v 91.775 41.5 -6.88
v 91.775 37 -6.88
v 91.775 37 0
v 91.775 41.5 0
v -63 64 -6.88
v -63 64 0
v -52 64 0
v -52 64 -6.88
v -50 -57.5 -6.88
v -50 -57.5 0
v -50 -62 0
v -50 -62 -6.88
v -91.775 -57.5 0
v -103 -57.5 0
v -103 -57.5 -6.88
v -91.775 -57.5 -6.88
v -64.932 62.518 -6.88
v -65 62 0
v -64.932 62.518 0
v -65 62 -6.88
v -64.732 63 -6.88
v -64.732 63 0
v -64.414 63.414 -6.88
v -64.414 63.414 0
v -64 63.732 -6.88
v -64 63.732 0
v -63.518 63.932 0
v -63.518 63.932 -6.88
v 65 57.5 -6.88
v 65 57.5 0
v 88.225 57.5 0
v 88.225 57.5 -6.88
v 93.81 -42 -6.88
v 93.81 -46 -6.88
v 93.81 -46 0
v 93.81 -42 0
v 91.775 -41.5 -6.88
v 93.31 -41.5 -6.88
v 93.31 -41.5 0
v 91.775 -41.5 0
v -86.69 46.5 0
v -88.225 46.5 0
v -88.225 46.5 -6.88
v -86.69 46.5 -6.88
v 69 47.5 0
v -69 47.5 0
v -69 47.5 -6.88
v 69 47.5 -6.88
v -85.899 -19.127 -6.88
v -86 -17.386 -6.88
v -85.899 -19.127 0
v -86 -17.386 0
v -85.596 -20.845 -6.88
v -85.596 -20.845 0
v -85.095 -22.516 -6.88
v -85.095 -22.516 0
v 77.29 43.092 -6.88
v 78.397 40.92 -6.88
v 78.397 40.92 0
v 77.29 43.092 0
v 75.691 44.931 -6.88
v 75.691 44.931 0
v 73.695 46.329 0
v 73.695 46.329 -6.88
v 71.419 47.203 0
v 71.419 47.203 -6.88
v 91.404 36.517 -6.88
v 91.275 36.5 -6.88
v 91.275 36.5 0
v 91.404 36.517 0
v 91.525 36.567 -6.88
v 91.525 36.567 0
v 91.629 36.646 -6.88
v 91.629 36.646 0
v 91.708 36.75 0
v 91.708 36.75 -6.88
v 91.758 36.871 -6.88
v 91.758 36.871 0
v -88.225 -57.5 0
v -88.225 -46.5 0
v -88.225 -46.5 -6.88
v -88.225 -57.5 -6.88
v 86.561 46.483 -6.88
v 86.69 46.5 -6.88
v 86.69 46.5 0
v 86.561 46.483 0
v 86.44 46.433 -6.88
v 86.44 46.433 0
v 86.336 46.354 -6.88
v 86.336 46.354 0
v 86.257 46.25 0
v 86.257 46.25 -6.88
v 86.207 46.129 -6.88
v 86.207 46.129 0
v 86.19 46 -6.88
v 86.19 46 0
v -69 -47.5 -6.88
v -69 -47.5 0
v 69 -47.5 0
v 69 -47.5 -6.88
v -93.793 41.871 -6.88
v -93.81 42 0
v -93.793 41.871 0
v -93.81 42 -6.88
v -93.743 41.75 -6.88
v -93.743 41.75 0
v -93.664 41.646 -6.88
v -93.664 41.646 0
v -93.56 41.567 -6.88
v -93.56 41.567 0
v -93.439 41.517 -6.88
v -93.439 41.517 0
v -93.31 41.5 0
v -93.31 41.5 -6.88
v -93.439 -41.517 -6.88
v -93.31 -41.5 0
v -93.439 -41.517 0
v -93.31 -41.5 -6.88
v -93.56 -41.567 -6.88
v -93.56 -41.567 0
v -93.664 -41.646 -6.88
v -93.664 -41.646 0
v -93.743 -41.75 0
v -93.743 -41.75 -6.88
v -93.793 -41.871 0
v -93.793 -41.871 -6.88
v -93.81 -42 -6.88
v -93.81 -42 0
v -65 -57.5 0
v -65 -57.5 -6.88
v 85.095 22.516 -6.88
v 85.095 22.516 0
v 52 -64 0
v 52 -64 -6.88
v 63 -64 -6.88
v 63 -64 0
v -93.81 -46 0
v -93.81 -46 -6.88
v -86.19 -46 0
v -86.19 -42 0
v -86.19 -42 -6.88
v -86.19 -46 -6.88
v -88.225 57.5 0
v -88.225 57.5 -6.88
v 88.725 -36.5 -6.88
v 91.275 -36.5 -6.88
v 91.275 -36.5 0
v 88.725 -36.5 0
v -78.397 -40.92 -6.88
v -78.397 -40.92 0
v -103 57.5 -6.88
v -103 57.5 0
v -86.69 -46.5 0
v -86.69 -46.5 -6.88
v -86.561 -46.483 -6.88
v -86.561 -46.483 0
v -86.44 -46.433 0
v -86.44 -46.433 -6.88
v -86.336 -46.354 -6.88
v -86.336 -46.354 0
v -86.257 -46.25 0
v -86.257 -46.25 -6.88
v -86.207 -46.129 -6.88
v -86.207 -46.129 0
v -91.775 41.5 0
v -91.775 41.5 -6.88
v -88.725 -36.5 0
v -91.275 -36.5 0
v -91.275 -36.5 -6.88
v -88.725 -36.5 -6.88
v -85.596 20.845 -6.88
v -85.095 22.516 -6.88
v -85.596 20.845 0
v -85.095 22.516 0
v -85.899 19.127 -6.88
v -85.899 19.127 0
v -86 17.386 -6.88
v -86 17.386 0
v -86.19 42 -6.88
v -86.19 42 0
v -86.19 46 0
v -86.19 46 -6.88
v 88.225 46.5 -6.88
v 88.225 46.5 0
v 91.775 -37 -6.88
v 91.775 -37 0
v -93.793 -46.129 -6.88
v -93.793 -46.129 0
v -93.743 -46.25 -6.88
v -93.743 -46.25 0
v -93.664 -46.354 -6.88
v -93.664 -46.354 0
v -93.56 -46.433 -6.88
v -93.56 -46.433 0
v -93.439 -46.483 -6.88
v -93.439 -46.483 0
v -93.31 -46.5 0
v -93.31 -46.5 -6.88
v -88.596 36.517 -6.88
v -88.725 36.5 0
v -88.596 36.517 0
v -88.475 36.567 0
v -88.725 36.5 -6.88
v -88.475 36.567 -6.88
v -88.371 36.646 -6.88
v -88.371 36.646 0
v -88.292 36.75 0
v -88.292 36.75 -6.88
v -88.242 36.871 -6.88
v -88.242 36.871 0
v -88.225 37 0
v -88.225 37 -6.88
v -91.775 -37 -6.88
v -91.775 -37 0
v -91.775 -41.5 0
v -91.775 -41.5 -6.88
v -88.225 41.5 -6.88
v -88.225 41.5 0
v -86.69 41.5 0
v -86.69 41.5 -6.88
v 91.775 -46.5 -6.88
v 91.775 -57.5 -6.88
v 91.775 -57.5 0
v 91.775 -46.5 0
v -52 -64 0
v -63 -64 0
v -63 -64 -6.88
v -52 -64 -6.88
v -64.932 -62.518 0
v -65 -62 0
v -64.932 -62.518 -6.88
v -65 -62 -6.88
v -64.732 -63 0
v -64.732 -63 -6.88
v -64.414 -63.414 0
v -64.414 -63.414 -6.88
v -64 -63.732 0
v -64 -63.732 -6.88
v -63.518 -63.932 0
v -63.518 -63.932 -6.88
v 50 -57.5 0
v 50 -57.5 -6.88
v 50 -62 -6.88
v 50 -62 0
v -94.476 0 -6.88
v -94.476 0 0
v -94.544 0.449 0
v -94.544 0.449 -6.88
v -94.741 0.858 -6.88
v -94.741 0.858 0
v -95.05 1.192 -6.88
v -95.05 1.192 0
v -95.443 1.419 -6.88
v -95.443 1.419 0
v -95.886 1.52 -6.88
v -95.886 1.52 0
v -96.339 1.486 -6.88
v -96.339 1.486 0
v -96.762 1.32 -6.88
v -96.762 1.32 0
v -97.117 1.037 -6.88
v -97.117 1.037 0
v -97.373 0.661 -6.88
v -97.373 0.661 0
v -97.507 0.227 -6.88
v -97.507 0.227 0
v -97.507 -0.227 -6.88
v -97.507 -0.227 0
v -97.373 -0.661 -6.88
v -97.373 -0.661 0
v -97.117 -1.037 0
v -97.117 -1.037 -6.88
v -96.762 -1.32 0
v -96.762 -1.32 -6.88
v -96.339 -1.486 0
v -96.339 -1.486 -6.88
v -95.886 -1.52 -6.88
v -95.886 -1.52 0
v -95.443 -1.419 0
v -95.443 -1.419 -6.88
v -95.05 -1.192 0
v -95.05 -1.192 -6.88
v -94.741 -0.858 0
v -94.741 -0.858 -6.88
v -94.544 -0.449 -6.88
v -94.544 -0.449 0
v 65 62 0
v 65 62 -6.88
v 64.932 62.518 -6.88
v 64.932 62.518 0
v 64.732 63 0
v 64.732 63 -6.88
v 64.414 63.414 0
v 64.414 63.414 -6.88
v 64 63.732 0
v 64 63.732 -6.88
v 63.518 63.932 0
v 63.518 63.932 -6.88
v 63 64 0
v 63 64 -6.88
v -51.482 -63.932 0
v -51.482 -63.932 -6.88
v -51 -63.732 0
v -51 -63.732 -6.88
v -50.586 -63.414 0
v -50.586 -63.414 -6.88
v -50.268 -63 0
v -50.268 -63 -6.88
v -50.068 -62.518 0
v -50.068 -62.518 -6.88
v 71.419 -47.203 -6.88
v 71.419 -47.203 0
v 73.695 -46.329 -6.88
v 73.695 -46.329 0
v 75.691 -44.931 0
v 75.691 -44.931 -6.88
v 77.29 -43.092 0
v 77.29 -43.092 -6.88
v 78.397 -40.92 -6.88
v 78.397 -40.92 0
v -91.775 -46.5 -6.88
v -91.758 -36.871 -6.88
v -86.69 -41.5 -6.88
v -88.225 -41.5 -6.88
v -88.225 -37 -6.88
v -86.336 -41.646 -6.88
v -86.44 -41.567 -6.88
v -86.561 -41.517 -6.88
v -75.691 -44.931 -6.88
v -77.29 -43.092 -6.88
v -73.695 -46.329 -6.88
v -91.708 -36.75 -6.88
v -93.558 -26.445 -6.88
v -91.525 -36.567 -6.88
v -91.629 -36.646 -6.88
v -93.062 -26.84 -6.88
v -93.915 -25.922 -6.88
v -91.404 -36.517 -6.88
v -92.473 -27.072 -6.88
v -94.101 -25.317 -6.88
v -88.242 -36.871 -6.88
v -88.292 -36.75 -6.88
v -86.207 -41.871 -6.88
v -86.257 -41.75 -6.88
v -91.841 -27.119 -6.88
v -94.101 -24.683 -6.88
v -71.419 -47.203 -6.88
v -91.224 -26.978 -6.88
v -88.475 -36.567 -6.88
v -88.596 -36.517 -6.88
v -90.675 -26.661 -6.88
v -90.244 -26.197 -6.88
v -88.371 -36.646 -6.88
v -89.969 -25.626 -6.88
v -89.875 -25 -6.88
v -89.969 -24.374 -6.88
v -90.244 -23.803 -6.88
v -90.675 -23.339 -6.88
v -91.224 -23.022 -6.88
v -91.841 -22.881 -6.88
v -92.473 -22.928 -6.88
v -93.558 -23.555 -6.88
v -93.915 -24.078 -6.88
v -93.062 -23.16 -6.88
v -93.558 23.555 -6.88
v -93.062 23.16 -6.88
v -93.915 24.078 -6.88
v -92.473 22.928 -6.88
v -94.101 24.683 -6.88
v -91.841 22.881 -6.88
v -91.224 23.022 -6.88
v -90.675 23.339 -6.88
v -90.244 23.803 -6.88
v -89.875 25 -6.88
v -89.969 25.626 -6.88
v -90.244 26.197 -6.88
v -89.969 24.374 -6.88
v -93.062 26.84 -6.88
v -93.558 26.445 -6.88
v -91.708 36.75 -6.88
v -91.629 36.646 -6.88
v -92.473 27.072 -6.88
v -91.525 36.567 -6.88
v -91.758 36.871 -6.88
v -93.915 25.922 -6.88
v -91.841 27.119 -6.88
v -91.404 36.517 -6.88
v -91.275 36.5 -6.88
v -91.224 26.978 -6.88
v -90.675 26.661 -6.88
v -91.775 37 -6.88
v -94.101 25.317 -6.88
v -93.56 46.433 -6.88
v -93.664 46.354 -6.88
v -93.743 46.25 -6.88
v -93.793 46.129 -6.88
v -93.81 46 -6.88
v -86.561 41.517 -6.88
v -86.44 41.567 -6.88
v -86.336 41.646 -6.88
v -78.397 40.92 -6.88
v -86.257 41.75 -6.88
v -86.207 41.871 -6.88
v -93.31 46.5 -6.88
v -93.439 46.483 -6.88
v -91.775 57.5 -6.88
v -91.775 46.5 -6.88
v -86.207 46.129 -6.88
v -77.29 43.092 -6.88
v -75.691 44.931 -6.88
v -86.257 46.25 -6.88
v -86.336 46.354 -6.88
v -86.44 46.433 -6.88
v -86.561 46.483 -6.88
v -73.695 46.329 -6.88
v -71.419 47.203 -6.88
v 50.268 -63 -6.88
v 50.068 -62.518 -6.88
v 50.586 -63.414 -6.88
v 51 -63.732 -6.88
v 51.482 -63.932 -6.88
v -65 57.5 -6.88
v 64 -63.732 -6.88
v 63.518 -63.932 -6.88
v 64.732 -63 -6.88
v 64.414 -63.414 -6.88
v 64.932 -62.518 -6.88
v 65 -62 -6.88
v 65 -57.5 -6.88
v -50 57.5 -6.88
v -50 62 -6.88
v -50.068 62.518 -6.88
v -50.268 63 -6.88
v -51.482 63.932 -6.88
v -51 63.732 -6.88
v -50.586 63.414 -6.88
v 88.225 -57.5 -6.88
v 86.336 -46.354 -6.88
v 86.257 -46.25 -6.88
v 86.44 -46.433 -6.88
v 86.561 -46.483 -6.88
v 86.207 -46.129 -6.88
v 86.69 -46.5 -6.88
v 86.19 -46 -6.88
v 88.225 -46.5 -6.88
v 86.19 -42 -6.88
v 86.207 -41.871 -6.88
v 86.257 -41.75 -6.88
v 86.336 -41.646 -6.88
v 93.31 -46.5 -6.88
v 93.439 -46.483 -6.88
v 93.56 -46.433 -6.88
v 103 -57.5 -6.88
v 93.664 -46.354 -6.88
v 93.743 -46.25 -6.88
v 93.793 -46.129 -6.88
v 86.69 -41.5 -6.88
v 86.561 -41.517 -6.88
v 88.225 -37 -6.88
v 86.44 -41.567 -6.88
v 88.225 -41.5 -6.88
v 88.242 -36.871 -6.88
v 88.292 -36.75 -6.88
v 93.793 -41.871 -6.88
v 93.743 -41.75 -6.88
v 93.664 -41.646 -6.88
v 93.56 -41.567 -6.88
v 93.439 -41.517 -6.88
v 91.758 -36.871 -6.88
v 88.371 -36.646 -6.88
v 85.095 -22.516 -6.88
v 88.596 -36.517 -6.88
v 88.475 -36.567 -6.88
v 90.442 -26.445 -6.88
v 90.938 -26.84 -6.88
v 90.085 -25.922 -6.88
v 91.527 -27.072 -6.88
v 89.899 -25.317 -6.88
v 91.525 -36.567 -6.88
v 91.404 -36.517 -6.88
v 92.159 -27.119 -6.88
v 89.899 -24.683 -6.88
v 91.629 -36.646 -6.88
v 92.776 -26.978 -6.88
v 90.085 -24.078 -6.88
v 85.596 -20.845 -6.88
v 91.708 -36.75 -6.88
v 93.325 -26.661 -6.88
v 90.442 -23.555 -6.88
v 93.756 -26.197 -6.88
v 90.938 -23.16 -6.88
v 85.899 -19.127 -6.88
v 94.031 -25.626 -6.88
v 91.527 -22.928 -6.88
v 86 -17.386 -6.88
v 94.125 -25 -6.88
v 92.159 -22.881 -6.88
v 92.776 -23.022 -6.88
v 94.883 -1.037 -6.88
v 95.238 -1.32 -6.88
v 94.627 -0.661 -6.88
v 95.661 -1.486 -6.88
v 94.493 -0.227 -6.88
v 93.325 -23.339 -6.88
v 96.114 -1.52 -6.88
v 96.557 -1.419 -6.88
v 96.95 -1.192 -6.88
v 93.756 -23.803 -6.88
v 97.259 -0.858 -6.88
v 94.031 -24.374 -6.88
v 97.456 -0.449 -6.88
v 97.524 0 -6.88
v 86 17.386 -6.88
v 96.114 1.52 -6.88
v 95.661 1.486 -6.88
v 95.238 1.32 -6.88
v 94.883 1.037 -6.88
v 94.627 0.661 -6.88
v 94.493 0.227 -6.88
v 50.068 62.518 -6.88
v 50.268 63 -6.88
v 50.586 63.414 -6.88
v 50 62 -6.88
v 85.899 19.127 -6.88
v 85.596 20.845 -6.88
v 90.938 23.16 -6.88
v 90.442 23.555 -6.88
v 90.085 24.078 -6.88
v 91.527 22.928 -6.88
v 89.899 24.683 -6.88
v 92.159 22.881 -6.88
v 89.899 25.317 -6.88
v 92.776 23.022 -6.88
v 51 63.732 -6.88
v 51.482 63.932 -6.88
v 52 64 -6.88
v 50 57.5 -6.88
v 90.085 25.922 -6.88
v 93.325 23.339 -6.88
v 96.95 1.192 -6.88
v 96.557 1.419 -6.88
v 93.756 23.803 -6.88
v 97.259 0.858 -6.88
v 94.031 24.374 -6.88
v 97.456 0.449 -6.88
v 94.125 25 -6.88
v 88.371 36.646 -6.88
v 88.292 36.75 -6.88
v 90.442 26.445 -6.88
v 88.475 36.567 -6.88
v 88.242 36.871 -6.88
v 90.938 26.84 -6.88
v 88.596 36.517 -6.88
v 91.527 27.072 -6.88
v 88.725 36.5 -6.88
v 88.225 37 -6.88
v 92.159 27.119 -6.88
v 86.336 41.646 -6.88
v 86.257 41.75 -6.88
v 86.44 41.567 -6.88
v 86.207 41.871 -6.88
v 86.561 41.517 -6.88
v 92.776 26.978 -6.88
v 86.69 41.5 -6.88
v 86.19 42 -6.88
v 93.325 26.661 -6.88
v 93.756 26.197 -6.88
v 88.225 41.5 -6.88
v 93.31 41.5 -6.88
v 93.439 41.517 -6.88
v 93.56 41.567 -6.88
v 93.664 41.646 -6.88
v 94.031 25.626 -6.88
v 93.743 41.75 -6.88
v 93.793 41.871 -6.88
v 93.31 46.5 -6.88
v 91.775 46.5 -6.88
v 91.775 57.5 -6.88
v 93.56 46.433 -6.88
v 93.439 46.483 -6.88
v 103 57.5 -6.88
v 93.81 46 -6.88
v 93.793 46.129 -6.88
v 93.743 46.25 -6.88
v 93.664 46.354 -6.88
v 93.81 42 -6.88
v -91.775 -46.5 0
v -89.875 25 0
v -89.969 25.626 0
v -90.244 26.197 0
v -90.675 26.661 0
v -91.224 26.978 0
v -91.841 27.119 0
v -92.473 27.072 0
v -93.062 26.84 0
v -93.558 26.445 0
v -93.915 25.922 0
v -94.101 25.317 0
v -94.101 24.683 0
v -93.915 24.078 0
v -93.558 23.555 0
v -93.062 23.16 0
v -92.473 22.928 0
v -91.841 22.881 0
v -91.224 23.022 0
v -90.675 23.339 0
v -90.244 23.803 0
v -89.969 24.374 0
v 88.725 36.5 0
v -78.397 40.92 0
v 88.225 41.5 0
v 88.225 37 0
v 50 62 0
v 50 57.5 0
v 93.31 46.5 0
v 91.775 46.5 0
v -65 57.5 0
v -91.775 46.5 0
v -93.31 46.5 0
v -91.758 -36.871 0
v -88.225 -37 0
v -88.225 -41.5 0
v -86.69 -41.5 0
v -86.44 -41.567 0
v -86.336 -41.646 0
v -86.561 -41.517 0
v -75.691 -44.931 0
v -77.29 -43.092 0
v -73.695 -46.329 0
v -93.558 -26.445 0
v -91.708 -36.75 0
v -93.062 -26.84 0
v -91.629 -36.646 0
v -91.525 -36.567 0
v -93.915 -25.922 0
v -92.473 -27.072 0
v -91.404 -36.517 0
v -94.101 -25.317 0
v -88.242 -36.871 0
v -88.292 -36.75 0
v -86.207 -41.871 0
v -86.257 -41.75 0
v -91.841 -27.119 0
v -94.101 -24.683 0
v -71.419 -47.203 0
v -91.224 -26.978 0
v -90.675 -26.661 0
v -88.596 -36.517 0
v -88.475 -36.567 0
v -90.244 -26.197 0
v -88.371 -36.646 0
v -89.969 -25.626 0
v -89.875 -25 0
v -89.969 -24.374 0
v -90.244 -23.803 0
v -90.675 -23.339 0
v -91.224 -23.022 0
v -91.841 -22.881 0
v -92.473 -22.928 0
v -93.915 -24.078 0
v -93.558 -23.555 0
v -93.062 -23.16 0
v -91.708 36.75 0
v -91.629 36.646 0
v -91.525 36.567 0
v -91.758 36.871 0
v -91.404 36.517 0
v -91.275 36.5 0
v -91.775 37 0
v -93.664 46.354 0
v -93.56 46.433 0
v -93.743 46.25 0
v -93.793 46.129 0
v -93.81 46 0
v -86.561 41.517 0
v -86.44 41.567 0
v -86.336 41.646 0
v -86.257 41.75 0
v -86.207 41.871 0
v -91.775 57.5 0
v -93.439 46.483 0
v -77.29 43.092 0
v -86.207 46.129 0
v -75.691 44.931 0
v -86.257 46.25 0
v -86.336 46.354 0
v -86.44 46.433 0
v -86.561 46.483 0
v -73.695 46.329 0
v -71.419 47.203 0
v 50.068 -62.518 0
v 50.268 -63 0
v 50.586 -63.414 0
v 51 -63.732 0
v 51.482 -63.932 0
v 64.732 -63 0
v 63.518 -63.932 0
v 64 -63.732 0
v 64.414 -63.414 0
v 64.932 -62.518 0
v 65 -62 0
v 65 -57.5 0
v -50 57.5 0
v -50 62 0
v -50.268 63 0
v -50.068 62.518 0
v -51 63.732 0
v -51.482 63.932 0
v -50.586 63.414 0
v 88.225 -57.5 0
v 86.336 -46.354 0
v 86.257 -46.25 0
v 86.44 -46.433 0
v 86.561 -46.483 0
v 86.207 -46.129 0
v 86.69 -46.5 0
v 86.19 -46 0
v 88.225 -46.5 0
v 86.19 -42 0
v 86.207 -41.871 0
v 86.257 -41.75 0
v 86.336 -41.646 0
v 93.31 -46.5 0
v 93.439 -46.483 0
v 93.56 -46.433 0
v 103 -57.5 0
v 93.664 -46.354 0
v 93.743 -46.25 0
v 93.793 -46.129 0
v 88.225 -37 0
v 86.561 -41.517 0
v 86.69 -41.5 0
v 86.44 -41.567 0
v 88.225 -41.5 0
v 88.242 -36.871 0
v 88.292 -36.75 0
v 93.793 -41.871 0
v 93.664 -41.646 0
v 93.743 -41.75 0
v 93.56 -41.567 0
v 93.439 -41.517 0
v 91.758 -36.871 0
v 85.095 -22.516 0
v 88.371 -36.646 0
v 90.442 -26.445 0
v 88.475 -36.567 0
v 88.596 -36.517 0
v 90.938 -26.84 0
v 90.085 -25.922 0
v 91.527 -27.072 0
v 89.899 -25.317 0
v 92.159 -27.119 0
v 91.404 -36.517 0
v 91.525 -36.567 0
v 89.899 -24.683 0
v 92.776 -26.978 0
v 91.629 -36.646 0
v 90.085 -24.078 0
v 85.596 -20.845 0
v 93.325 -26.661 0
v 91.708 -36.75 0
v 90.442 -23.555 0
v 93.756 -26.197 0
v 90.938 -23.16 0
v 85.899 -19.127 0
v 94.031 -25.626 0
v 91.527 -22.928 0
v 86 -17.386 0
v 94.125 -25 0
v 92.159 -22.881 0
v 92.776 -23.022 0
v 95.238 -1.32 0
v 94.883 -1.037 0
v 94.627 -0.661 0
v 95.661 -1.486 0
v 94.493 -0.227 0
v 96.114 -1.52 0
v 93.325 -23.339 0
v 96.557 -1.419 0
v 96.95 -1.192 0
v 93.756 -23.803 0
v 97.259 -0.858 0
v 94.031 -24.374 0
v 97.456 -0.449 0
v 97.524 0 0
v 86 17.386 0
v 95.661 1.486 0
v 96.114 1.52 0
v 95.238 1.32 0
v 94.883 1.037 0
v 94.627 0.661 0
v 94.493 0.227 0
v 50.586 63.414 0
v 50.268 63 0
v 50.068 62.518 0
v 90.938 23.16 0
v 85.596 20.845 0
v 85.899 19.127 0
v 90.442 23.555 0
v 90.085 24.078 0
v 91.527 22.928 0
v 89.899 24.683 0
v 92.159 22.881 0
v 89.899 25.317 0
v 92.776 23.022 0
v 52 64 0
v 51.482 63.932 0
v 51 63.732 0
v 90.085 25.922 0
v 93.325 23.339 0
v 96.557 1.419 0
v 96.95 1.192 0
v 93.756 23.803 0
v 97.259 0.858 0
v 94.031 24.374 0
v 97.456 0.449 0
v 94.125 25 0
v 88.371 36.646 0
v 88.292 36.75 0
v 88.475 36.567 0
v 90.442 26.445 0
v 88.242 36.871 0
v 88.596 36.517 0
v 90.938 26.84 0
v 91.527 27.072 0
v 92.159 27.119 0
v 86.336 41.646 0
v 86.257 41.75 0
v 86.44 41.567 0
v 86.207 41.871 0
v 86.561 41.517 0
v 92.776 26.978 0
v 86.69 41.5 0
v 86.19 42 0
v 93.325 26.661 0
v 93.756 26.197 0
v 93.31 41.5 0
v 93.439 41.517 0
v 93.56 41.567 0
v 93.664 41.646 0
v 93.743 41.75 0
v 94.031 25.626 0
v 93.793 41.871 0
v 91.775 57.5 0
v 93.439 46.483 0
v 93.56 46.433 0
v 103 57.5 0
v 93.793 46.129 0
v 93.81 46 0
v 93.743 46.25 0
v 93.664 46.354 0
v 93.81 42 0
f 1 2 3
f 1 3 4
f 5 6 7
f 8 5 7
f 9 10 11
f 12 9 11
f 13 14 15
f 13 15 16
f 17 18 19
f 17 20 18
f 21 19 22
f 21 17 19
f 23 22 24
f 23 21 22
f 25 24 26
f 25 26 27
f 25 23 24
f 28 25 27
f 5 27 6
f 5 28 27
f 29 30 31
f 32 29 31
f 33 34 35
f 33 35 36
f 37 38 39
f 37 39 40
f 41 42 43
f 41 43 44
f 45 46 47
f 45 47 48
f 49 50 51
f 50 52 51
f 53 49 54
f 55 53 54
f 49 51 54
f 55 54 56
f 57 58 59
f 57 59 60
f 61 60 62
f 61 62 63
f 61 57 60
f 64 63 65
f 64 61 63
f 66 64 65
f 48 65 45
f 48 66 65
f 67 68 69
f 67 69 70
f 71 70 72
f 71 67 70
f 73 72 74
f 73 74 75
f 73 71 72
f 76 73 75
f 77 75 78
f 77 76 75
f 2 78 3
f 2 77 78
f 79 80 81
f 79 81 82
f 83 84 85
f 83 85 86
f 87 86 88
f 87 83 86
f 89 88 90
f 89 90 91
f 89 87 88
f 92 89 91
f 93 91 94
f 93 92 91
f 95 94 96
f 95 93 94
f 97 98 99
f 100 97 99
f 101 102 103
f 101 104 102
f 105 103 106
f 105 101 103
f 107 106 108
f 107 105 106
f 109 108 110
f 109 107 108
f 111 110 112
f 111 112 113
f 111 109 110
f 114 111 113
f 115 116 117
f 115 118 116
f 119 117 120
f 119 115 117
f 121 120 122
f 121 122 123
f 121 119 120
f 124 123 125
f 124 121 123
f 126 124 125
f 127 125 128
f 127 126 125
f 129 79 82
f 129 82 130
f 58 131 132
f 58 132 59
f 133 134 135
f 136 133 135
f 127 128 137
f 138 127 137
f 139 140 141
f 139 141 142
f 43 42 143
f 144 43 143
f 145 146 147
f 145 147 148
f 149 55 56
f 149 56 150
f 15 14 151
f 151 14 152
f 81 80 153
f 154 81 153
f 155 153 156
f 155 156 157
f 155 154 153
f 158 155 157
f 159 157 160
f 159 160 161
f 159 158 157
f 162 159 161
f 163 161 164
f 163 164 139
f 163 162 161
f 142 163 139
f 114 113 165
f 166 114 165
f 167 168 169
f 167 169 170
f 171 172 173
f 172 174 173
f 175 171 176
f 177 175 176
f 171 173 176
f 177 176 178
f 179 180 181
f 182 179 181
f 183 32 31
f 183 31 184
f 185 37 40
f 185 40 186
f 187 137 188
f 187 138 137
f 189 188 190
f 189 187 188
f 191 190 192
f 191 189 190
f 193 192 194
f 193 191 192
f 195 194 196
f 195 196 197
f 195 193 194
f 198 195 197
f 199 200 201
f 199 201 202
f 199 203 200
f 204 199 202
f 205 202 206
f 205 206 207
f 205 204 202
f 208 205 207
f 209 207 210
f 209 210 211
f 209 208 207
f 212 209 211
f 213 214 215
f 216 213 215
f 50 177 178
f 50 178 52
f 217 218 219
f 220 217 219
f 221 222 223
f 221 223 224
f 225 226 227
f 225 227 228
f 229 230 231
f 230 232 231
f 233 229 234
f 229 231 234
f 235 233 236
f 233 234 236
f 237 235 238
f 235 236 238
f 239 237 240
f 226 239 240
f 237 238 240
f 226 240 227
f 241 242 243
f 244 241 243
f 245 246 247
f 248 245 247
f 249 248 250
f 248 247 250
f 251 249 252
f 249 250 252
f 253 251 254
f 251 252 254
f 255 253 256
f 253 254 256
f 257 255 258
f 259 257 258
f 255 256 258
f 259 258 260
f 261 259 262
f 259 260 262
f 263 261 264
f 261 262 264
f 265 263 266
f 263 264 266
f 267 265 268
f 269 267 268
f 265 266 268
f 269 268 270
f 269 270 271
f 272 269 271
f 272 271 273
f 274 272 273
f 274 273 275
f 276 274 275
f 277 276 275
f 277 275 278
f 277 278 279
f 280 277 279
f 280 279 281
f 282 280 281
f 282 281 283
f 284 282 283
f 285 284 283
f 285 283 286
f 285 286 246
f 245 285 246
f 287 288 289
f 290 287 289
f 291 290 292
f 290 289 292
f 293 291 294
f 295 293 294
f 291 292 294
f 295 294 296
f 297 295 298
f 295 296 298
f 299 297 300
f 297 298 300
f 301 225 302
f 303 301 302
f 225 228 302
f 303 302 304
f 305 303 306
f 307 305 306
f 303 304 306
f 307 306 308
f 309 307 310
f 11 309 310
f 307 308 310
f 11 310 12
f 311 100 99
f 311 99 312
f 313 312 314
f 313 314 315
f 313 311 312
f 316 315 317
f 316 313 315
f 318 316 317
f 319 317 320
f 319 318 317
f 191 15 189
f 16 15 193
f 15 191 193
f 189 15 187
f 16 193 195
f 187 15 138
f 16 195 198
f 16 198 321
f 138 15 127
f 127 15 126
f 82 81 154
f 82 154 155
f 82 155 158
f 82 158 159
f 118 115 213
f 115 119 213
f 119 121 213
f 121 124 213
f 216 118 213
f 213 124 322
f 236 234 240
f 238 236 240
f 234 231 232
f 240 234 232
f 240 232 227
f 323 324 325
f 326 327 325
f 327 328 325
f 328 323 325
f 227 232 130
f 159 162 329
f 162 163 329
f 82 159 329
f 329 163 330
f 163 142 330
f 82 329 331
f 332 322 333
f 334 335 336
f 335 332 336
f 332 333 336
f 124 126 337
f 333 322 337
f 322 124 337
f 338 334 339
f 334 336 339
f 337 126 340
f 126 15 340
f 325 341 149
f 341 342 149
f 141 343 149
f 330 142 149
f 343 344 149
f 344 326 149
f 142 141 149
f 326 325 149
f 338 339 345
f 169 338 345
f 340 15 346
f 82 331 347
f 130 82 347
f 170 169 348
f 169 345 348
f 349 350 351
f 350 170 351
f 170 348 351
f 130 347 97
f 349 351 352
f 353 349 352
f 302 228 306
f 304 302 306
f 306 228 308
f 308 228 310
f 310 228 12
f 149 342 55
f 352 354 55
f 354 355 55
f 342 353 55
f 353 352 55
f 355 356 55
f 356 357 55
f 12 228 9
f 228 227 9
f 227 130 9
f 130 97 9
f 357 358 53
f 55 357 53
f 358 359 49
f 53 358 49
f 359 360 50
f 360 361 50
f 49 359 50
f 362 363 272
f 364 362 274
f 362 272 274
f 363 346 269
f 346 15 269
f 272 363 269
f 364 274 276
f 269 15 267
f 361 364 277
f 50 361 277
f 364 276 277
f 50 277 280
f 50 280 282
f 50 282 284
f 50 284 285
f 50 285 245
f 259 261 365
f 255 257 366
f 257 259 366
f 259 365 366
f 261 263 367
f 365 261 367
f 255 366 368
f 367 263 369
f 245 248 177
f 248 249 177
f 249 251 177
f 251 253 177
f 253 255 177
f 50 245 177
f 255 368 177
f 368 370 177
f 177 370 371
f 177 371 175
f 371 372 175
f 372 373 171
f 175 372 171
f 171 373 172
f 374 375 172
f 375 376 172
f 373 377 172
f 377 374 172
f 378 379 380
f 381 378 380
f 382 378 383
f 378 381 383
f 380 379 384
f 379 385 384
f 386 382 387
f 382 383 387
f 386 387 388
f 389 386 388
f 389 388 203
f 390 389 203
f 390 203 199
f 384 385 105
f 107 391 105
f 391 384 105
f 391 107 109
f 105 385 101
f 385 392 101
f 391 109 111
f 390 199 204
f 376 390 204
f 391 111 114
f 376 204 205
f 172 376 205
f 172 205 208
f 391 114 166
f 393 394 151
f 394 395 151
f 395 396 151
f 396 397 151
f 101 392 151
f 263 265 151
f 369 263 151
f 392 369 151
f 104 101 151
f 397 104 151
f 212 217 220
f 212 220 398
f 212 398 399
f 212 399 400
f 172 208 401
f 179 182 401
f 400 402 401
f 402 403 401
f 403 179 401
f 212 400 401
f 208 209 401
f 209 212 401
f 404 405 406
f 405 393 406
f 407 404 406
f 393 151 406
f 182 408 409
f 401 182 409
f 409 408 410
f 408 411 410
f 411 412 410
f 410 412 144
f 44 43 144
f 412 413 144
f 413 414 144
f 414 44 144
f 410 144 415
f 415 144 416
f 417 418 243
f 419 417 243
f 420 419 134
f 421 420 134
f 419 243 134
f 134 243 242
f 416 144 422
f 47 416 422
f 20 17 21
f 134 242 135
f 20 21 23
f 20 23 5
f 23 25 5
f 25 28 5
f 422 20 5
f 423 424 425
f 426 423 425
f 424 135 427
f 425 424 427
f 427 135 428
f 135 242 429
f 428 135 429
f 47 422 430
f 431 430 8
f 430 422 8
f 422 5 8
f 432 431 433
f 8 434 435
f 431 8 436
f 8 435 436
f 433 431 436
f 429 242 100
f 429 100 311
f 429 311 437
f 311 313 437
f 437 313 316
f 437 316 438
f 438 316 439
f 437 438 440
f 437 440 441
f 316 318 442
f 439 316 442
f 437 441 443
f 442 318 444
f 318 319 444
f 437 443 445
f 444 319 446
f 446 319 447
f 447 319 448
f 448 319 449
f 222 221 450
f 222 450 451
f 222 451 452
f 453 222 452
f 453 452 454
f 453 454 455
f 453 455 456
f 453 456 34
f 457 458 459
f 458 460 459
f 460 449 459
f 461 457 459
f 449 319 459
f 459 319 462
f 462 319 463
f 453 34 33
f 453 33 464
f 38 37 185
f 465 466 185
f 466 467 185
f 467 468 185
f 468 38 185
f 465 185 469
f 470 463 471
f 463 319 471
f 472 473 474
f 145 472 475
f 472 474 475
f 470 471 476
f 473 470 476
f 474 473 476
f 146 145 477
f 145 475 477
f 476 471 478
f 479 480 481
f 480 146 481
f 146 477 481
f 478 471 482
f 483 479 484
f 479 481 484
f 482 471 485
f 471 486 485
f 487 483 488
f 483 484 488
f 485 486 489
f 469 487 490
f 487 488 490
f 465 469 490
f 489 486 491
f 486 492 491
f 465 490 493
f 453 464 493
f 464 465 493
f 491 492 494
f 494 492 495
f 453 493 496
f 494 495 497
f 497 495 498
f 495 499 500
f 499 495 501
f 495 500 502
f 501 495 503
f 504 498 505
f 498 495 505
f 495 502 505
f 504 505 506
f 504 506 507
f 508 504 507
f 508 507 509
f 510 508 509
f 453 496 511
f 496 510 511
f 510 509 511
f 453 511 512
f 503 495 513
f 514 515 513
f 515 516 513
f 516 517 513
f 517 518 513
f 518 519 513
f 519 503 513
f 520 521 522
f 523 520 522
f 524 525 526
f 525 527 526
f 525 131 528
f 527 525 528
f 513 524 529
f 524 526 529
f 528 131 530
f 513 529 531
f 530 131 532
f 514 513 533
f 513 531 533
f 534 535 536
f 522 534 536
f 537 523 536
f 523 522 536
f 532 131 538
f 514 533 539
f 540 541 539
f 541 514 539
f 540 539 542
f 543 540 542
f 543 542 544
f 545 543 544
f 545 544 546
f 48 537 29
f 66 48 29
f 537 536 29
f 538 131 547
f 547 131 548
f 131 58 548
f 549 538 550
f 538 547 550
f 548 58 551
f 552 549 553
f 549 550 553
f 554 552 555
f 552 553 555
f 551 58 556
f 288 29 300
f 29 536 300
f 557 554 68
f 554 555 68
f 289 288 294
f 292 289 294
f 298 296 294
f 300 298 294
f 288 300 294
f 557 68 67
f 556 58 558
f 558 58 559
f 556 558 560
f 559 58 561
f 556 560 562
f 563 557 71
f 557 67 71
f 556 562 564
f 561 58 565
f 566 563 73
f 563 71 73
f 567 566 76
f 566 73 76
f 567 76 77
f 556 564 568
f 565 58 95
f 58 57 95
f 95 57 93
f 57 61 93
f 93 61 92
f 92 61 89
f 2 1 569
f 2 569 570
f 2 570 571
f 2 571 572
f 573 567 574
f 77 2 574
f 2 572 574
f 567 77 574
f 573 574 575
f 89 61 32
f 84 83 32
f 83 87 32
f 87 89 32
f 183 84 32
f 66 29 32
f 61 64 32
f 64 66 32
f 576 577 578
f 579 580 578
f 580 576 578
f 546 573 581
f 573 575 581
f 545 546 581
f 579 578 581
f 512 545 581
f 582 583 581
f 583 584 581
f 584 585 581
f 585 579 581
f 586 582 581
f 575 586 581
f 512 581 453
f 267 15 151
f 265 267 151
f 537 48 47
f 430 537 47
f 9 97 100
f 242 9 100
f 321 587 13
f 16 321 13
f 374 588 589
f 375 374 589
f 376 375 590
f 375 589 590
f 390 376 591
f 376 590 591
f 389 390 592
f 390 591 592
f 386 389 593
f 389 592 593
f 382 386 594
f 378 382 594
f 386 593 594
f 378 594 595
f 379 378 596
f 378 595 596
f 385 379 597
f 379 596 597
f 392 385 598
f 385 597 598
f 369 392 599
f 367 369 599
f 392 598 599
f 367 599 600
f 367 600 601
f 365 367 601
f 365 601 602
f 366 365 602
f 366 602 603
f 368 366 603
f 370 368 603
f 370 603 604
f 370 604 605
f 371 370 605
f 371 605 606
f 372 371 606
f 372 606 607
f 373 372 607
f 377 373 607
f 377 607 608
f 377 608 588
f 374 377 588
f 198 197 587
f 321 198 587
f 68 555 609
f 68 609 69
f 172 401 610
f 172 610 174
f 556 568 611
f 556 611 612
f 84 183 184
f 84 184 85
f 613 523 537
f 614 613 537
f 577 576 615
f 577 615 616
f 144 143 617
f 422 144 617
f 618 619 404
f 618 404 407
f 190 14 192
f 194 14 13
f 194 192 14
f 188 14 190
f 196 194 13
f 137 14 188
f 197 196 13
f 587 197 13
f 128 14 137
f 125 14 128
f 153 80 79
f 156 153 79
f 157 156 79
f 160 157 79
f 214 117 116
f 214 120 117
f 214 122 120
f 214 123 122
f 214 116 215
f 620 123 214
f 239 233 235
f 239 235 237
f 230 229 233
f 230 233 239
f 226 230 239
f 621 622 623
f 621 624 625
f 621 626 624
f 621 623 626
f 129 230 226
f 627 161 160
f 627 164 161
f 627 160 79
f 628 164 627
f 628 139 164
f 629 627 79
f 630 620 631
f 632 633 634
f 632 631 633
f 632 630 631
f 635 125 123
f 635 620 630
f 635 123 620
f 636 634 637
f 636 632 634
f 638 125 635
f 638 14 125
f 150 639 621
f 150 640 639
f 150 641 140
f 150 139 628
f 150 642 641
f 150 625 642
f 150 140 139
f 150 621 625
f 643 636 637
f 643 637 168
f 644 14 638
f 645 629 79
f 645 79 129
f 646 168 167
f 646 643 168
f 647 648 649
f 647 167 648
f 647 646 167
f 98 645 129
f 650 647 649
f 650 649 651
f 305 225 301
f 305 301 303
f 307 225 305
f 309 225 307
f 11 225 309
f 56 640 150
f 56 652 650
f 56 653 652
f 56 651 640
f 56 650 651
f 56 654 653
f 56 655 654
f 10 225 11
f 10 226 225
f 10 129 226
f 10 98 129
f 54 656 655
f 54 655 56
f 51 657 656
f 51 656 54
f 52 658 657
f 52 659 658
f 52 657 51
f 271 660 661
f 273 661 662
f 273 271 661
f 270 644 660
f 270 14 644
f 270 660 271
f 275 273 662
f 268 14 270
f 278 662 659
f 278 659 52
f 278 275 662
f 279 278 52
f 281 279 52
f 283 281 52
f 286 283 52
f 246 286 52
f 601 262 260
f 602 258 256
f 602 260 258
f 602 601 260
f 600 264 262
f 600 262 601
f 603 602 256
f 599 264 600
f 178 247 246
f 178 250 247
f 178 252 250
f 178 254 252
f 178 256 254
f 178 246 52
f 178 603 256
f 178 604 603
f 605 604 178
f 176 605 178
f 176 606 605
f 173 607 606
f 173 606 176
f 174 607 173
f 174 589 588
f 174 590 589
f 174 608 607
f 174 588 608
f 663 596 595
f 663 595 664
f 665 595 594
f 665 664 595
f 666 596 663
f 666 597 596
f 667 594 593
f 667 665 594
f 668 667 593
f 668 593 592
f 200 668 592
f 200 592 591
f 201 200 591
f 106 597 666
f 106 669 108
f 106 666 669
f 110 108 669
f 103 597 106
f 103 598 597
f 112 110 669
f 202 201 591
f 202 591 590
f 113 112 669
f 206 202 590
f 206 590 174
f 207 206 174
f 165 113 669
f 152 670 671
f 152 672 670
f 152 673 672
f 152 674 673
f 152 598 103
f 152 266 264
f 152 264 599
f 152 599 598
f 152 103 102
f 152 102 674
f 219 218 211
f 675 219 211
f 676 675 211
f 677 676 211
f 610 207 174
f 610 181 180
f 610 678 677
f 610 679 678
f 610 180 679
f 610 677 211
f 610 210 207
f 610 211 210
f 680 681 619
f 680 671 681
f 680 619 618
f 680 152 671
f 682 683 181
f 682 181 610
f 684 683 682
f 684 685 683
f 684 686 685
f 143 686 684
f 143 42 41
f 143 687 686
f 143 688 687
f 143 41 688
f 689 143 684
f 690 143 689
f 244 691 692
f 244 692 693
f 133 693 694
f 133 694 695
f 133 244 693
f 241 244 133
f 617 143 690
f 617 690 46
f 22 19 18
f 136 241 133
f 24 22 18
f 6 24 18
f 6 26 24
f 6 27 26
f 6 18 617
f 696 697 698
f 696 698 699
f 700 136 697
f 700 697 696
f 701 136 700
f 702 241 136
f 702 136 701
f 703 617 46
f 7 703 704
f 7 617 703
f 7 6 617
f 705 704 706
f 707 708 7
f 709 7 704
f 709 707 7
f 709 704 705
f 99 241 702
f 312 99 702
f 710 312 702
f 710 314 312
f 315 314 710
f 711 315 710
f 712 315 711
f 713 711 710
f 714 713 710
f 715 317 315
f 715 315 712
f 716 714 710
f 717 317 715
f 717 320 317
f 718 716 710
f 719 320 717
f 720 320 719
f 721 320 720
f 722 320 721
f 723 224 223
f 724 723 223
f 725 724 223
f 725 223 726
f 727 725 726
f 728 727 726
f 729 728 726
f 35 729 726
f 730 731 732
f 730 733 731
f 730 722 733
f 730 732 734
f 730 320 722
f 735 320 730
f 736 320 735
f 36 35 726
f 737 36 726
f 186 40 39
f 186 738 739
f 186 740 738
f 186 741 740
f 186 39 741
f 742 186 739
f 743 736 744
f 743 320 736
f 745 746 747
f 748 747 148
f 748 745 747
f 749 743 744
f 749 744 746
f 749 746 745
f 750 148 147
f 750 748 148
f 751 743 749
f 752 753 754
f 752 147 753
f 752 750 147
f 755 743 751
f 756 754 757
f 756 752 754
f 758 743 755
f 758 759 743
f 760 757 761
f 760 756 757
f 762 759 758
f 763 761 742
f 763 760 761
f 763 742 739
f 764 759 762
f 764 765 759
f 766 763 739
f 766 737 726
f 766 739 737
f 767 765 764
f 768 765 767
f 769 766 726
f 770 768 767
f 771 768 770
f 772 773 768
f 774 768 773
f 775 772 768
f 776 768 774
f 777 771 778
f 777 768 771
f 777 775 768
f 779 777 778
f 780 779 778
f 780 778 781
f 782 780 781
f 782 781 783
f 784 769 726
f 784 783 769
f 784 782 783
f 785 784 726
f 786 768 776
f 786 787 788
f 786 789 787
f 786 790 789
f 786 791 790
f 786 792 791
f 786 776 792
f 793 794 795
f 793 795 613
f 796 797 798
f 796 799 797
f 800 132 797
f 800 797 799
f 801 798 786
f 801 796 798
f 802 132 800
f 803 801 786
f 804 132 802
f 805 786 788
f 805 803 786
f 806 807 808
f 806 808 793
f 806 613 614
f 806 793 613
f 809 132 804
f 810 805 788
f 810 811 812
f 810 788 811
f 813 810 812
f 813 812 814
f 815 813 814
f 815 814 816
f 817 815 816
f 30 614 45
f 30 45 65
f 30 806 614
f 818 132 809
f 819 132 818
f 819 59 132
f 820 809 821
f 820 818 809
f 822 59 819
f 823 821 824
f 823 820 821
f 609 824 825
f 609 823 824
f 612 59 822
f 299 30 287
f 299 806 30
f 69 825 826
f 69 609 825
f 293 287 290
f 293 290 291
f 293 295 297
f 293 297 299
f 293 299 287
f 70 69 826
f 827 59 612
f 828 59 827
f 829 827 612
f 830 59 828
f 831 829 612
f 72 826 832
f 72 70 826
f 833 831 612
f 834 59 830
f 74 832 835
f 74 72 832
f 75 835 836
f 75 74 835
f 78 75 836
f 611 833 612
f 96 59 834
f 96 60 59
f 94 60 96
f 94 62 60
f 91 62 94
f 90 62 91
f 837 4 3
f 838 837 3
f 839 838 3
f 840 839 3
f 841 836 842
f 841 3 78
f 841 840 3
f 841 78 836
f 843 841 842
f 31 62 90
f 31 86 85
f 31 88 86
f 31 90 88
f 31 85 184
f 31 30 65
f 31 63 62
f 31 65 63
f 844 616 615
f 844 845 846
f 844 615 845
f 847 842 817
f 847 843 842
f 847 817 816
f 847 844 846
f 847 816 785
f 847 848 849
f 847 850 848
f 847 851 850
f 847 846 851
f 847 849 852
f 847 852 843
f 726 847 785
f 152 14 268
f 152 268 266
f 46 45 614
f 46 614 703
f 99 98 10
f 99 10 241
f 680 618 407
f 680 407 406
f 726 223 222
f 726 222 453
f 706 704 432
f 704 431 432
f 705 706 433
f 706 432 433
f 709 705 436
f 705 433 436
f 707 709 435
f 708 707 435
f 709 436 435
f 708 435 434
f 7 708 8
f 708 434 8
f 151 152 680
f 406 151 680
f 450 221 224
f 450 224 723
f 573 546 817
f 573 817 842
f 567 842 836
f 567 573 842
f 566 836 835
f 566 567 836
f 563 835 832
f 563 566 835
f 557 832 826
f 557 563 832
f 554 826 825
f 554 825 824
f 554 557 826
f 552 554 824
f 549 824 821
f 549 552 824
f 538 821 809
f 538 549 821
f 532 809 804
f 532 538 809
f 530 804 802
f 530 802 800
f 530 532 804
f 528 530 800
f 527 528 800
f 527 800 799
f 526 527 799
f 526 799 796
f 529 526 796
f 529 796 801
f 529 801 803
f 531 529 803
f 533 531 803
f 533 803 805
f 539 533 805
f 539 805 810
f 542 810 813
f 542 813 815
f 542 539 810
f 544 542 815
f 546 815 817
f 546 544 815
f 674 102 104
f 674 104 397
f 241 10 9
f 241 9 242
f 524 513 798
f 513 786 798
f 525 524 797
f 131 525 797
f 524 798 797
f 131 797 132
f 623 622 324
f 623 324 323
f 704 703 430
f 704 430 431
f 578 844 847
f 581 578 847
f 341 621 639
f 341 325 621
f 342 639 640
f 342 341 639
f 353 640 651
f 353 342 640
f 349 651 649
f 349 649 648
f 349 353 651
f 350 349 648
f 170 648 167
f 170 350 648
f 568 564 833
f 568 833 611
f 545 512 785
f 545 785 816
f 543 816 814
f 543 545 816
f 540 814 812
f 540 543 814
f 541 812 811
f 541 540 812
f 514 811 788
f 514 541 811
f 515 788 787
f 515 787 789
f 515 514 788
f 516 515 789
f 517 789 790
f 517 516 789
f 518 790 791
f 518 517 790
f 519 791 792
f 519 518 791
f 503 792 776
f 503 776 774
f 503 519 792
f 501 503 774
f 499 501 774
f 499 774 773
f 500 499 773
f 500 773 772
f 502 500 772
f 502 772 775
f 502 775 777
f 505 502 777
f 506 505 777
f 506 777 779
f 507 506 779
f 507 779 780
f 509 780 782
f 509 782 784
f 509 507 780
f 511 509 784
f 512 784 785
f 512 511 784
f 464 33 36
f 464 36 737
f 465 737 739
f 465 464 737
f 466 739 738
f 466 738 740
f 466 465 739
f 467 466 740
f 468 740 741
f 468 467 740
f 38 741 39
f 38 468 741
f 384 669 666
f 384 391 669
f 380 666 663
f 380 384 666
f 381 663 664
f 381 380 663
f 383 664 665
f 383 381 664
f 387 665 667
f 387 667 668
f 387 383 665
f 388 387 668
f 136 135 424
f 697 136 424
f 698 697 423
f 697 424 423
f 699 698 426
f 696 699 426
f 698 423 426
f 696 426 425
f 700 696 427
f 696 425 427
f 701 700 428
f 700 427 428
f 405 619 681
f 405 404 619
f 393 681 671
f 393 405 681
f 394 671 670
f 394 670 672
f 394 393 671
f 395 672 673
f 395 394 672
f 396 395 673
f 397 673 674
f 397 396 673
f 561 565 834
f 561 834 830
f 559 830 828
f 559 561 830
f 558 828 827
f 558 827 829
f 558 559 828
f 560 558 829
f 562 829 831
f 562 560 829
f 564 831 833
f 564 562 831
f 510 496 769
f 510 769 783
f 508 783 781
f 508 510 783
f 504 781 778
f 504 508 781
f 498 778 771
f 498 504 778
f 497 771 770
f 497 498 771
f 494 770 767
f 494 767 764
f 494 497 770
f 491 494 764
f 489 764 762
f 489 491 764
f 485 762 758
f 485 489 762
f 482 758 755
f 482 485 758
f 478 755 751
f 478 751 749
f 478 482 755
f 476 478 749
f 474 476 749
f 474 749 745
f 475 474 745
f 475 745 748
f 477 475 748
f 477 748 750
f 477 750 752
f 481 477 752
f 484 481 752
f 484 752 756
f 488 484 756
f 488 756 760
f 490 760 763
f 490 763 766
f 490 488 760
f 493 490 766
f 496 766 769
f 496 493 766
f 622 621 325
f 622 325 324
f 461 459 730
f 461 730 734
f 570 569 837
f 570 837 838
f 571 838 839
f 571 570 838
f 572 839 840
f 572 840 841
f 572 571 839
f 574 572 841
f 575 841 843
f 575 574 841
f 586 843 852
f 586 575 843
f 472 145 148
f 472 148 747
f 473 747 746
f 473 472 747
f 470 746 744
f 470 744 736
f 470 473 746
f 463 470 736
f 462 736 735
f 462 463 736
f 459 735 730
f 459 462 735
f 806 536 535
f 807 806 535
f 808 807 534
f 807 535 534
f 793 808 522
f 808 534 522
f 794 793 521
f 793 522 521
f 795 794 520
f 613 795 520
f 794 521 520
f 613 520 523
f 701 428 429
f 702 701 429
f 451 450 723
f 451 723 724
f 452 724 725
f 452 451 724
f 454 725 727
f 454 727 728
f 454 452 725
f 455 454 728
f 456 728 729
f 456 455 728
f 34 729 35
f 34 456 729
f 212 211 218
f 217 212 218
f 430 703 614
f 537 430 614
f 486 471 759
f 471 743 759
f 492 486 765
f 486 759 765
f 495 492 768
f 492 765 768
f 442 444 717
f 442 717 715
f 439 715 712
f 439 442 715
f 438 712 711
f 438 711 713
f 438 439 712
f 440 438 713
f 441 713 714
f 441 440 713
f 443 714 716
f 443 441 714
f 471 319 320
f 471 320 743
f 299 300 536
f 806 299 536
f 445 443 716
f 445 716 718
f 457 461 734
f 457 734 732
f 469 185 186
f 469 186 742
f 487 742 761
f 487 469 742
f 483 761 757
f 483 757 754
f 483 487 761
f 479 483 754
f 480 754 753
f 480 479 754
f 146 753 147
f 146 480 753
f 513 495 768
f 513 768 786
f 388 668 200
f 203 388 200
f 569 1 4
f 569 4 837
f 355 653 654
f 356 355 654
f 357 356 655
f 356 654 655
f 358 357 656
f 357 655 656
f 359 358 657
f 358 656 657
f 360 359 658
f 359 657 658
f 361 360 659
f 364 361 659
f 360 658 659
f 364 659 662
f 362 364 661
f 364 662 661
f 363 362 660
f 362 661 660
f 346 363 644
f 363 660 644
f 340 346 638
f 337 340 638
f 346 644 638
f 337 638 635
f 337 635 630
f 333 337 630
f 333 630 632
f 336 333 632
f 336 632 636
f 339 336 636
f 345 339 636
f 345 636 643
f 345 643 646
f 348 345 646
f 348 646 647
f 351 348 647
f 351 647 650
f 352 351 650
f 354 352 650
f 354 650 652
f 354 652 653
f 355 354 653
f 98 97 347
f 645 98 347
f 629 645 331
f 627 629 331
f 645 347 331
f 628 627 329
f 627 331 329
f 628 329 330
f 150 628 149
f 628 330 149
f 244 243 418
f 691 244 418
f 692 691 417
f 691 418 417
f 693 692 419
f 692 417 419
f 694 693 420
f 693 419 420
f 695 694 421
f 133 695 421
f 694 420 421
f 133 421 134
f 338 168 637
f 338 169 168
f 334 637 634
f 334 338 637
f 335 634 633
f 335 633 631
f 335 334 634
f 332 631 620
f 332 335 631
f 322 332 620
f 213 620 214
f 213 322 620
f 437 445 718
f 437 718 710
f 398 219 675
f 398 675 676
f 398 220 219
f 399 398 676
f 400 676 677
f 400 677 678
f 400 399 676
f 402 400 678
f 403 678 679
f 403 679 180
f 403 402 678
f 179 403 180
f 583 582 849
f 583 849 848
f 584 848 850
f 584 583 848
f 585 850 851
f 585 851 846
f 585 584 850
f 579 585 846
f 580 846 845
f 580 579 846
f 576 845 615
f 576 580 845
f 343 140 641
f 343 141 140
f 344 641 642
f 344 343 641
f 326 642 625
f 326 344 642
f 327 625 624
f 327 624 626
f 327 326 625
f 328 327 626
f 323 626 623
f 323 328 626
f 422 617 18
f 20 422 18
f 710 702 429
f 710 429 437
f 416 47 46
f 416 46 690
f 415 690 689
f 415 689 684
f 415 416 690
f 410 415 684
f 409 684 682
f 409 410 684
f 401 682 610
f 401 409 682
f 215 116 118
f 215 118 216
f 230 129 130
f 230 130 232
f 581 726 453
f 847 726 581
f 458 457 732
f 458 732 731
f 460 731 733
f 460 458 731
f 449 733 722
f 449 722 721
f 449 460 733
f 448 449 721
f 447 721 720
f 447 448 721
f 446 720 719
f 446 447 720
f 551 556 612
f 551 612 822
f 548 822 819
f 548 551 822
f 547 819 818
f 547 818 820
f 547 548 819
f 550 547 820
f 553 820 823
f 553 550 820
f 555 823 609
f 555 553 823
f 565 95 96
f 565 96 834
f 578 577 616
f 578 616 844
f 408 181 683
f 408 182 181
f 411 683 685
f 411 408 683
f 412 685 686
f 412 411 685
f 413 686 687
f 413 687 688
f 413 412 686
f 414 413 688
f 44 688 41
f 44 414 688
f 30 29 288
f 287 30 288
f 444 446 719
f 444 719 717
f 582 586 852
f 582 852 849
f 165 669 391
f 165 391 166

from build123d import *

# Parameters (mm, degrees)
SKETCH1_W            = 206
SKETCH1_H            = 115
BOSS_EXTRUDE1_DEPTH  = 6.88
SKETCH2_W            = 158
SKETCH2_H            = 95
CUT_EXTRUDE1_DEPTH   = 119.163380114
FILLET1_R            = 10
SKETCH3_W            = 3.55
SKETCH3_H            = 42
CUT_EXTRUDE2_DEPTH   = 119.163380114
SKETCH4_W            = 7.62
SKETCH4_H            = 5
CUT_EXTRUDE3_DEPTH   = 119.163380114
FILLET4_R            = 0.5
SKETCH5_W            = 15
SKETCH5_H            = 6.5
BOSS_EXTRUDE2_DEPTH  = 6.88
FILLET3_R            = 2
FILLET4_OF_MIRROR1_R = 0.5
FILLET3_OF_MIRROR1_R = 2
CUT_EXTRUDE4_START   = -6.88
CUT_EXTRUDE4_DEPTH   = 6.88
SKETCH7_R            = 2.125
SKETCH7_R_2          = 1.524
CUT_EXTRUDE5_DEPTH   = 122.459188207
MIRROR2_START        = -6.88
MIRROR2_OUTLINE_R    = 2.125
MIRROR2_OUTLINE_R_2  = 1.524
MIRROR2_DEPTH        = 6.88
MIRROR2_2_DEPTH      = 6.88
FILLET2_R            = 15


# Read off the part's stored shape, not the designer's step: Cut-Extrude4, Mirror2
with BuildPart() as part:
    # Sketch1 → Boss-Extrude1 (new body)
    with BuildSketch(Plane.XY):
        Rectangle(SKETCH1_W, SKETCH1_H)
    extrude(amount=-BOSS_EXTRUDE1_DEPTH)

    # Sketch2 → Cut-Extrude1 (cut, through all)
    with BuildSketch(Plane.XY):
        Rectangle(SKETCH2_W, SKETCH2_H)
    extrude(amount=-CUT_EXTRUDE1_DEPTH, mode=Mode.SUBTRACT)

    # Fillet1
    fillet1_edges = [part.edges().sort_by_distance(p)[0] for p in [
        (-79, -47.5, -3.44),
        (-79, 47.5, -3.44),
        (79, 47.5, -3.44),
        (79, -47.5, -3.44),
    ]]
    fillet(fillet1_edges, radius=FILLET1_R)

    # Sketch3 → Cut-Extrude2 (cut, through all)
    with BuildSketch(Plane.XY):
        with Locations((-90, 57.5)):
            Rectangle(SKETCH3_W, SKETCH3_H)
    cut_extrude2 = extrude(amount=-CUT_EXTRUDE2_DEPTH, mode=Mode.SUBTRACT)

    # Sketch4 → Cut-Extrude3 (cut, through all)
    with BuildSketch(Plane.XY):
        with Locations((-90, 44)):
            Rectangle(SKETCH4_W, SKETCH4_H)
    cut_extrude3 = extrude(amount=-CUT_EXTRUDE3_DEPTH, mode=Mode.SUBTRACT)

    # Fillet4
    fillet4_edges = [part.edges().sort_by_distance(p)[0] for p in [
        (-88.225, 36.5, -3.44),
        (-91.775, 36.5, -3.44),
        (-86.19, 41.5, -3.44),
        (-93.81, 46.5, -3.44),
        (-86.19, 46.5, -3.44),
        (-93.81, 41.5, -3.44),
    ]]
    fillet(fillet4_edges, radius=FILLET4_R)

    # Sketch5 → Boss-Extrude2 (add)
    with BuildSketch(Plane.XY):
        with Locations((-57.5, 60.75)):
            Rectangle(SKETCH5_W, SKETCH5_H)
    boss_extrude2 = extrude(amount=-BOSS_EXTRUDE2_DEPTH)

    # Fillet3
    fillet3_edges = [part.edges().sort_by_distance(p)[0] for p in [
        (-50, 64, -3.44),
        (-65, 64, -3.44),
    ]]
    fillet(fillet3_edges, radius=FILLET3_R)

    # Mirror1: Cut-Extrude2, Cut-Extrude3, Boss-Extrude2 across plane
    add(cut_extrude2.mirror(Plane.ZX), mode=Mode.SUBTRACT)
    add(cut_extrude3.mirror(Plane.ZX), mode=Mode.SUBTRACT)
    add(boss_extrude2.mirror(Plane.ZX))

    # Fillet4 of Mirror1
    fillet4_of_mirror1_edges = [part.edges().sort_by_distance(p)[0] for p in [
        (-88.225, -36.5, -3.44),
        (-91.775, -36.5, -3.44),
        (-86.19, -41.5, -3.44),
        (-93.81, -46.5, -3.44),
        (-86.19, -46.5, -3.44),
        (-93.81, -41.5, -3.44),
    ]]
    fillet(fillet4_of_mirror1_edges, radius=FILLET4_OF_MIRROR1_R)

    # Fillet3 of Mirror1
    fillet3_of_mirror1_edges = [part.edges().sort_by_distance(p)[0] for p in [
        (-50, -64, -3.44),
        (-65, -64, -3.44),
    ]]
    fillet(fillet3_of_mirror1_edges, radius=FILLET3_OF_MIRROR1_R)

    # Cut-Extrude4 outline → Cut-Extrude4 (cut)
    with BuildSketch(Plane.XY.offset(CUT_EXTRUDE4_START)):
        with BuildLine():
            Line((-78.396926208, 40.920201433), (-86, 20.030927871))
            Line((-86, 20.030927871), (-86, -20.030927871))
            Line((-86, -20.030927871), (-78.396926208, -40.920201433))
            ThreePointArc((-78.396926208, -40.920201433), (-78.84807753, -39.236481777), (-79, -37.5))
            Line((-79, -37.5), (-79, 37.5))
            ThreePointArc((-79, 37.5), (-78.84807753, 39.236481777), (-78.396926208, 40.920201433))
        make_face()
    extrude(amount=CUT_EXTRUDE4_DEPTH, mode=Mode.SUBTRACT)

    # Sketch7 → Cut-Extrude5 (cut, through all)
    with BuildSketch(Plane.XY):
        with Locations((-92, 25)):
            Circle(SKETCH7_R)
        with Locations((-92, -25)):
            Circle(SKETCH7_R)
        with Locations((-96, 0)):
            Circle(SKETCH7_R_2)
    extrude(amount=-CUT_EXTRUDE5_DEPTH, mode=Mode.SUBTRACT)

    # Mirror2 outline → Mirror2 (cut)
    with BuildSketch(Plane.XY.offset(MIRROR2_START)):
        with BuildLine():
            Line((88.225, 57.5), (88.225, 46.5))
            Line((88.225, 46.5), (86.69, 46.5))
            ThreePointArc((86.69, 46.5), (86.336446609, 46.353553391), (86.19, 46))
            Line((86.19, 46), (86.19, 42))
            ThreePointArc((86.19, 42), (86.336446609, 41.646446609), (86.69, 41.5))
            Line((86.69, 41.5), (88.225, 41.5))
            Line((88.225, 41.5), (88.225, 37))
            ThreePointArc((88.225, 37), (88.371446609, 36.646446609), (88.725, 36.5))
            Line((88.725, 36.5), (91.275, 36.5))
            ThreePointArc((91.275, 36.5), (91.628553391, 36.646446609), (91.775, 37))
            Line((91.775, 37), (91.775, 41.5))
            Line((91.775, 41.5), (93.31, 41.5))
            ThreePointArc((93.31, 41.5), (93.663553391, 41.646446609), (93.81, 42))
            Line((93.81, 42), (93.81, 46))
            ThreePointArc((93.81, 46), (93.663553391, 46.353553391), (93.31, 46.5))
            Line((93.31, 46.5), (91.775, 46.5))
            Line((91.775, 46.5), (91.775, 57.5))
            Line((91.775, 57.5), (88.225, 57.5))
        make_face()
        with BuildLine():
            ThreePointArc((88.725, -36.5), (88.371446609, -36.646446609), (88.225, -37))
            Line((88.225, -37), (88.225, -41.5))
            Line((88.225, -41.5), (86.69, -41.5))
            ThreePointArc((86.69, -41.5), (86.336446609, -41.646446609), (86.19, -42))
            Line((86.19, -42), (86.19, -46))
            ThreePointArc((86.19, -46), (86.336446609, -46.353553391), (86.69, -46.5))
            Line((86.69, -46.5), (88.225, -46.5))
            Line((88.225, -46.5), (88.225, -57.5))
            Line((88.225, -57.5), (91.775, -57.5))
            Line((91.775, -57.5), (91.775, -46.5))
            Line((91.775, -46.5), (93.31, -46.5))
            ThreePointArc((93.31, -46.5), (93.663553391, -46.353553391), (93.81, -46))
            Line((93.81, -46), (93.81, -42))
            ThreePointArc((93.81, -42), (93.663553391, -41.646446609), (93.31, -41.5))
            Line((93.31, -41.5), (91.775, -41.5))
            Line((91.775, -41.5), (91.775, -37))
            ThreePointArc((91.775, -37), (91.628553391, -36.646446609), (91.275, -36.5))
            Line((91.275, -36.5), (88.725, -36.5))
        make_face()
        with BuildLine():
            Line((86, -20.030927871), (86, 20.030927871))
            Line((86, 20.030927871), (78.396926208, 40.920201433))
            ThreePointArc((78.396926208, 40.920201433), (78.84807753, 39.236481777), (79, 37.5))
            Line((79, 37.5), (79, -37.5))
            ThreePointArc((79, -37.5), (78.84807753, -39.236481777), (78.396926208, -40.920201433))
            Line((78.396926208, -40.920201433), (86, -20.030927871))
        make_face()
        with Locations((92, 25)):
            Circle(MIRROR2_OUTLINE_R)
        with Locations((92, -25)):
            Circle(MIRROR2_OUTLINE_R)
        with Locations((96, 0)):
            Circle(MIRROR2_OUTLINE_R_2)
    extrude(amount=MIRROR2_DEPTH, mode=Mode.SUBTRACT)

    # Mirror2 2 outline → Mirror2 2 (add)
    with BuildSketch(Plane.XY.offset(MIRROR2_START)):
        with BuildLine():
            Line((50, 57.5), (65, 57.5))
            Line((65, 57.5), (65, 62))
            ThreePointArc((65, 62), (64.414213562, 63.414213562), (63, 64))
            Line((63, 64), (52, 64))
            ThreePointArc((52, 64), (50.585786438, 63.414213562), (50, 62))
            Line((50, 62), (50, 57.5))
        make_face()
        with BuildLine():
            Line((65, -62), (65, -57.5))
            Line((65, -57.5), (50, -57.5))
            Line((50, -57.5), (50, -62))
            ThreePointArc((50, -62), (50.585786438, -63.414213562), (52, -64))
            Line((52, -64), (63, -64))
            ThreePointArc((63, -64), (64.414213562, -63.414213562), (65, -62))
        make_face()
    extrude(amount=MIRROR2_2_DEPTH)

    # Fillet2
    fillet2_edges = [part.edges().sort_by_distance(p)[0] for p in [
        (-86, -20.030927871, -3.44),
        (-86, 20.030927871, -3.44),
        (86, 20.030927871, -3.44),
        (86, -20.030927871, -3.44),
    ]]
    fillet(fillet2_edges, radius=FILLET2_R)


solid = part.part
